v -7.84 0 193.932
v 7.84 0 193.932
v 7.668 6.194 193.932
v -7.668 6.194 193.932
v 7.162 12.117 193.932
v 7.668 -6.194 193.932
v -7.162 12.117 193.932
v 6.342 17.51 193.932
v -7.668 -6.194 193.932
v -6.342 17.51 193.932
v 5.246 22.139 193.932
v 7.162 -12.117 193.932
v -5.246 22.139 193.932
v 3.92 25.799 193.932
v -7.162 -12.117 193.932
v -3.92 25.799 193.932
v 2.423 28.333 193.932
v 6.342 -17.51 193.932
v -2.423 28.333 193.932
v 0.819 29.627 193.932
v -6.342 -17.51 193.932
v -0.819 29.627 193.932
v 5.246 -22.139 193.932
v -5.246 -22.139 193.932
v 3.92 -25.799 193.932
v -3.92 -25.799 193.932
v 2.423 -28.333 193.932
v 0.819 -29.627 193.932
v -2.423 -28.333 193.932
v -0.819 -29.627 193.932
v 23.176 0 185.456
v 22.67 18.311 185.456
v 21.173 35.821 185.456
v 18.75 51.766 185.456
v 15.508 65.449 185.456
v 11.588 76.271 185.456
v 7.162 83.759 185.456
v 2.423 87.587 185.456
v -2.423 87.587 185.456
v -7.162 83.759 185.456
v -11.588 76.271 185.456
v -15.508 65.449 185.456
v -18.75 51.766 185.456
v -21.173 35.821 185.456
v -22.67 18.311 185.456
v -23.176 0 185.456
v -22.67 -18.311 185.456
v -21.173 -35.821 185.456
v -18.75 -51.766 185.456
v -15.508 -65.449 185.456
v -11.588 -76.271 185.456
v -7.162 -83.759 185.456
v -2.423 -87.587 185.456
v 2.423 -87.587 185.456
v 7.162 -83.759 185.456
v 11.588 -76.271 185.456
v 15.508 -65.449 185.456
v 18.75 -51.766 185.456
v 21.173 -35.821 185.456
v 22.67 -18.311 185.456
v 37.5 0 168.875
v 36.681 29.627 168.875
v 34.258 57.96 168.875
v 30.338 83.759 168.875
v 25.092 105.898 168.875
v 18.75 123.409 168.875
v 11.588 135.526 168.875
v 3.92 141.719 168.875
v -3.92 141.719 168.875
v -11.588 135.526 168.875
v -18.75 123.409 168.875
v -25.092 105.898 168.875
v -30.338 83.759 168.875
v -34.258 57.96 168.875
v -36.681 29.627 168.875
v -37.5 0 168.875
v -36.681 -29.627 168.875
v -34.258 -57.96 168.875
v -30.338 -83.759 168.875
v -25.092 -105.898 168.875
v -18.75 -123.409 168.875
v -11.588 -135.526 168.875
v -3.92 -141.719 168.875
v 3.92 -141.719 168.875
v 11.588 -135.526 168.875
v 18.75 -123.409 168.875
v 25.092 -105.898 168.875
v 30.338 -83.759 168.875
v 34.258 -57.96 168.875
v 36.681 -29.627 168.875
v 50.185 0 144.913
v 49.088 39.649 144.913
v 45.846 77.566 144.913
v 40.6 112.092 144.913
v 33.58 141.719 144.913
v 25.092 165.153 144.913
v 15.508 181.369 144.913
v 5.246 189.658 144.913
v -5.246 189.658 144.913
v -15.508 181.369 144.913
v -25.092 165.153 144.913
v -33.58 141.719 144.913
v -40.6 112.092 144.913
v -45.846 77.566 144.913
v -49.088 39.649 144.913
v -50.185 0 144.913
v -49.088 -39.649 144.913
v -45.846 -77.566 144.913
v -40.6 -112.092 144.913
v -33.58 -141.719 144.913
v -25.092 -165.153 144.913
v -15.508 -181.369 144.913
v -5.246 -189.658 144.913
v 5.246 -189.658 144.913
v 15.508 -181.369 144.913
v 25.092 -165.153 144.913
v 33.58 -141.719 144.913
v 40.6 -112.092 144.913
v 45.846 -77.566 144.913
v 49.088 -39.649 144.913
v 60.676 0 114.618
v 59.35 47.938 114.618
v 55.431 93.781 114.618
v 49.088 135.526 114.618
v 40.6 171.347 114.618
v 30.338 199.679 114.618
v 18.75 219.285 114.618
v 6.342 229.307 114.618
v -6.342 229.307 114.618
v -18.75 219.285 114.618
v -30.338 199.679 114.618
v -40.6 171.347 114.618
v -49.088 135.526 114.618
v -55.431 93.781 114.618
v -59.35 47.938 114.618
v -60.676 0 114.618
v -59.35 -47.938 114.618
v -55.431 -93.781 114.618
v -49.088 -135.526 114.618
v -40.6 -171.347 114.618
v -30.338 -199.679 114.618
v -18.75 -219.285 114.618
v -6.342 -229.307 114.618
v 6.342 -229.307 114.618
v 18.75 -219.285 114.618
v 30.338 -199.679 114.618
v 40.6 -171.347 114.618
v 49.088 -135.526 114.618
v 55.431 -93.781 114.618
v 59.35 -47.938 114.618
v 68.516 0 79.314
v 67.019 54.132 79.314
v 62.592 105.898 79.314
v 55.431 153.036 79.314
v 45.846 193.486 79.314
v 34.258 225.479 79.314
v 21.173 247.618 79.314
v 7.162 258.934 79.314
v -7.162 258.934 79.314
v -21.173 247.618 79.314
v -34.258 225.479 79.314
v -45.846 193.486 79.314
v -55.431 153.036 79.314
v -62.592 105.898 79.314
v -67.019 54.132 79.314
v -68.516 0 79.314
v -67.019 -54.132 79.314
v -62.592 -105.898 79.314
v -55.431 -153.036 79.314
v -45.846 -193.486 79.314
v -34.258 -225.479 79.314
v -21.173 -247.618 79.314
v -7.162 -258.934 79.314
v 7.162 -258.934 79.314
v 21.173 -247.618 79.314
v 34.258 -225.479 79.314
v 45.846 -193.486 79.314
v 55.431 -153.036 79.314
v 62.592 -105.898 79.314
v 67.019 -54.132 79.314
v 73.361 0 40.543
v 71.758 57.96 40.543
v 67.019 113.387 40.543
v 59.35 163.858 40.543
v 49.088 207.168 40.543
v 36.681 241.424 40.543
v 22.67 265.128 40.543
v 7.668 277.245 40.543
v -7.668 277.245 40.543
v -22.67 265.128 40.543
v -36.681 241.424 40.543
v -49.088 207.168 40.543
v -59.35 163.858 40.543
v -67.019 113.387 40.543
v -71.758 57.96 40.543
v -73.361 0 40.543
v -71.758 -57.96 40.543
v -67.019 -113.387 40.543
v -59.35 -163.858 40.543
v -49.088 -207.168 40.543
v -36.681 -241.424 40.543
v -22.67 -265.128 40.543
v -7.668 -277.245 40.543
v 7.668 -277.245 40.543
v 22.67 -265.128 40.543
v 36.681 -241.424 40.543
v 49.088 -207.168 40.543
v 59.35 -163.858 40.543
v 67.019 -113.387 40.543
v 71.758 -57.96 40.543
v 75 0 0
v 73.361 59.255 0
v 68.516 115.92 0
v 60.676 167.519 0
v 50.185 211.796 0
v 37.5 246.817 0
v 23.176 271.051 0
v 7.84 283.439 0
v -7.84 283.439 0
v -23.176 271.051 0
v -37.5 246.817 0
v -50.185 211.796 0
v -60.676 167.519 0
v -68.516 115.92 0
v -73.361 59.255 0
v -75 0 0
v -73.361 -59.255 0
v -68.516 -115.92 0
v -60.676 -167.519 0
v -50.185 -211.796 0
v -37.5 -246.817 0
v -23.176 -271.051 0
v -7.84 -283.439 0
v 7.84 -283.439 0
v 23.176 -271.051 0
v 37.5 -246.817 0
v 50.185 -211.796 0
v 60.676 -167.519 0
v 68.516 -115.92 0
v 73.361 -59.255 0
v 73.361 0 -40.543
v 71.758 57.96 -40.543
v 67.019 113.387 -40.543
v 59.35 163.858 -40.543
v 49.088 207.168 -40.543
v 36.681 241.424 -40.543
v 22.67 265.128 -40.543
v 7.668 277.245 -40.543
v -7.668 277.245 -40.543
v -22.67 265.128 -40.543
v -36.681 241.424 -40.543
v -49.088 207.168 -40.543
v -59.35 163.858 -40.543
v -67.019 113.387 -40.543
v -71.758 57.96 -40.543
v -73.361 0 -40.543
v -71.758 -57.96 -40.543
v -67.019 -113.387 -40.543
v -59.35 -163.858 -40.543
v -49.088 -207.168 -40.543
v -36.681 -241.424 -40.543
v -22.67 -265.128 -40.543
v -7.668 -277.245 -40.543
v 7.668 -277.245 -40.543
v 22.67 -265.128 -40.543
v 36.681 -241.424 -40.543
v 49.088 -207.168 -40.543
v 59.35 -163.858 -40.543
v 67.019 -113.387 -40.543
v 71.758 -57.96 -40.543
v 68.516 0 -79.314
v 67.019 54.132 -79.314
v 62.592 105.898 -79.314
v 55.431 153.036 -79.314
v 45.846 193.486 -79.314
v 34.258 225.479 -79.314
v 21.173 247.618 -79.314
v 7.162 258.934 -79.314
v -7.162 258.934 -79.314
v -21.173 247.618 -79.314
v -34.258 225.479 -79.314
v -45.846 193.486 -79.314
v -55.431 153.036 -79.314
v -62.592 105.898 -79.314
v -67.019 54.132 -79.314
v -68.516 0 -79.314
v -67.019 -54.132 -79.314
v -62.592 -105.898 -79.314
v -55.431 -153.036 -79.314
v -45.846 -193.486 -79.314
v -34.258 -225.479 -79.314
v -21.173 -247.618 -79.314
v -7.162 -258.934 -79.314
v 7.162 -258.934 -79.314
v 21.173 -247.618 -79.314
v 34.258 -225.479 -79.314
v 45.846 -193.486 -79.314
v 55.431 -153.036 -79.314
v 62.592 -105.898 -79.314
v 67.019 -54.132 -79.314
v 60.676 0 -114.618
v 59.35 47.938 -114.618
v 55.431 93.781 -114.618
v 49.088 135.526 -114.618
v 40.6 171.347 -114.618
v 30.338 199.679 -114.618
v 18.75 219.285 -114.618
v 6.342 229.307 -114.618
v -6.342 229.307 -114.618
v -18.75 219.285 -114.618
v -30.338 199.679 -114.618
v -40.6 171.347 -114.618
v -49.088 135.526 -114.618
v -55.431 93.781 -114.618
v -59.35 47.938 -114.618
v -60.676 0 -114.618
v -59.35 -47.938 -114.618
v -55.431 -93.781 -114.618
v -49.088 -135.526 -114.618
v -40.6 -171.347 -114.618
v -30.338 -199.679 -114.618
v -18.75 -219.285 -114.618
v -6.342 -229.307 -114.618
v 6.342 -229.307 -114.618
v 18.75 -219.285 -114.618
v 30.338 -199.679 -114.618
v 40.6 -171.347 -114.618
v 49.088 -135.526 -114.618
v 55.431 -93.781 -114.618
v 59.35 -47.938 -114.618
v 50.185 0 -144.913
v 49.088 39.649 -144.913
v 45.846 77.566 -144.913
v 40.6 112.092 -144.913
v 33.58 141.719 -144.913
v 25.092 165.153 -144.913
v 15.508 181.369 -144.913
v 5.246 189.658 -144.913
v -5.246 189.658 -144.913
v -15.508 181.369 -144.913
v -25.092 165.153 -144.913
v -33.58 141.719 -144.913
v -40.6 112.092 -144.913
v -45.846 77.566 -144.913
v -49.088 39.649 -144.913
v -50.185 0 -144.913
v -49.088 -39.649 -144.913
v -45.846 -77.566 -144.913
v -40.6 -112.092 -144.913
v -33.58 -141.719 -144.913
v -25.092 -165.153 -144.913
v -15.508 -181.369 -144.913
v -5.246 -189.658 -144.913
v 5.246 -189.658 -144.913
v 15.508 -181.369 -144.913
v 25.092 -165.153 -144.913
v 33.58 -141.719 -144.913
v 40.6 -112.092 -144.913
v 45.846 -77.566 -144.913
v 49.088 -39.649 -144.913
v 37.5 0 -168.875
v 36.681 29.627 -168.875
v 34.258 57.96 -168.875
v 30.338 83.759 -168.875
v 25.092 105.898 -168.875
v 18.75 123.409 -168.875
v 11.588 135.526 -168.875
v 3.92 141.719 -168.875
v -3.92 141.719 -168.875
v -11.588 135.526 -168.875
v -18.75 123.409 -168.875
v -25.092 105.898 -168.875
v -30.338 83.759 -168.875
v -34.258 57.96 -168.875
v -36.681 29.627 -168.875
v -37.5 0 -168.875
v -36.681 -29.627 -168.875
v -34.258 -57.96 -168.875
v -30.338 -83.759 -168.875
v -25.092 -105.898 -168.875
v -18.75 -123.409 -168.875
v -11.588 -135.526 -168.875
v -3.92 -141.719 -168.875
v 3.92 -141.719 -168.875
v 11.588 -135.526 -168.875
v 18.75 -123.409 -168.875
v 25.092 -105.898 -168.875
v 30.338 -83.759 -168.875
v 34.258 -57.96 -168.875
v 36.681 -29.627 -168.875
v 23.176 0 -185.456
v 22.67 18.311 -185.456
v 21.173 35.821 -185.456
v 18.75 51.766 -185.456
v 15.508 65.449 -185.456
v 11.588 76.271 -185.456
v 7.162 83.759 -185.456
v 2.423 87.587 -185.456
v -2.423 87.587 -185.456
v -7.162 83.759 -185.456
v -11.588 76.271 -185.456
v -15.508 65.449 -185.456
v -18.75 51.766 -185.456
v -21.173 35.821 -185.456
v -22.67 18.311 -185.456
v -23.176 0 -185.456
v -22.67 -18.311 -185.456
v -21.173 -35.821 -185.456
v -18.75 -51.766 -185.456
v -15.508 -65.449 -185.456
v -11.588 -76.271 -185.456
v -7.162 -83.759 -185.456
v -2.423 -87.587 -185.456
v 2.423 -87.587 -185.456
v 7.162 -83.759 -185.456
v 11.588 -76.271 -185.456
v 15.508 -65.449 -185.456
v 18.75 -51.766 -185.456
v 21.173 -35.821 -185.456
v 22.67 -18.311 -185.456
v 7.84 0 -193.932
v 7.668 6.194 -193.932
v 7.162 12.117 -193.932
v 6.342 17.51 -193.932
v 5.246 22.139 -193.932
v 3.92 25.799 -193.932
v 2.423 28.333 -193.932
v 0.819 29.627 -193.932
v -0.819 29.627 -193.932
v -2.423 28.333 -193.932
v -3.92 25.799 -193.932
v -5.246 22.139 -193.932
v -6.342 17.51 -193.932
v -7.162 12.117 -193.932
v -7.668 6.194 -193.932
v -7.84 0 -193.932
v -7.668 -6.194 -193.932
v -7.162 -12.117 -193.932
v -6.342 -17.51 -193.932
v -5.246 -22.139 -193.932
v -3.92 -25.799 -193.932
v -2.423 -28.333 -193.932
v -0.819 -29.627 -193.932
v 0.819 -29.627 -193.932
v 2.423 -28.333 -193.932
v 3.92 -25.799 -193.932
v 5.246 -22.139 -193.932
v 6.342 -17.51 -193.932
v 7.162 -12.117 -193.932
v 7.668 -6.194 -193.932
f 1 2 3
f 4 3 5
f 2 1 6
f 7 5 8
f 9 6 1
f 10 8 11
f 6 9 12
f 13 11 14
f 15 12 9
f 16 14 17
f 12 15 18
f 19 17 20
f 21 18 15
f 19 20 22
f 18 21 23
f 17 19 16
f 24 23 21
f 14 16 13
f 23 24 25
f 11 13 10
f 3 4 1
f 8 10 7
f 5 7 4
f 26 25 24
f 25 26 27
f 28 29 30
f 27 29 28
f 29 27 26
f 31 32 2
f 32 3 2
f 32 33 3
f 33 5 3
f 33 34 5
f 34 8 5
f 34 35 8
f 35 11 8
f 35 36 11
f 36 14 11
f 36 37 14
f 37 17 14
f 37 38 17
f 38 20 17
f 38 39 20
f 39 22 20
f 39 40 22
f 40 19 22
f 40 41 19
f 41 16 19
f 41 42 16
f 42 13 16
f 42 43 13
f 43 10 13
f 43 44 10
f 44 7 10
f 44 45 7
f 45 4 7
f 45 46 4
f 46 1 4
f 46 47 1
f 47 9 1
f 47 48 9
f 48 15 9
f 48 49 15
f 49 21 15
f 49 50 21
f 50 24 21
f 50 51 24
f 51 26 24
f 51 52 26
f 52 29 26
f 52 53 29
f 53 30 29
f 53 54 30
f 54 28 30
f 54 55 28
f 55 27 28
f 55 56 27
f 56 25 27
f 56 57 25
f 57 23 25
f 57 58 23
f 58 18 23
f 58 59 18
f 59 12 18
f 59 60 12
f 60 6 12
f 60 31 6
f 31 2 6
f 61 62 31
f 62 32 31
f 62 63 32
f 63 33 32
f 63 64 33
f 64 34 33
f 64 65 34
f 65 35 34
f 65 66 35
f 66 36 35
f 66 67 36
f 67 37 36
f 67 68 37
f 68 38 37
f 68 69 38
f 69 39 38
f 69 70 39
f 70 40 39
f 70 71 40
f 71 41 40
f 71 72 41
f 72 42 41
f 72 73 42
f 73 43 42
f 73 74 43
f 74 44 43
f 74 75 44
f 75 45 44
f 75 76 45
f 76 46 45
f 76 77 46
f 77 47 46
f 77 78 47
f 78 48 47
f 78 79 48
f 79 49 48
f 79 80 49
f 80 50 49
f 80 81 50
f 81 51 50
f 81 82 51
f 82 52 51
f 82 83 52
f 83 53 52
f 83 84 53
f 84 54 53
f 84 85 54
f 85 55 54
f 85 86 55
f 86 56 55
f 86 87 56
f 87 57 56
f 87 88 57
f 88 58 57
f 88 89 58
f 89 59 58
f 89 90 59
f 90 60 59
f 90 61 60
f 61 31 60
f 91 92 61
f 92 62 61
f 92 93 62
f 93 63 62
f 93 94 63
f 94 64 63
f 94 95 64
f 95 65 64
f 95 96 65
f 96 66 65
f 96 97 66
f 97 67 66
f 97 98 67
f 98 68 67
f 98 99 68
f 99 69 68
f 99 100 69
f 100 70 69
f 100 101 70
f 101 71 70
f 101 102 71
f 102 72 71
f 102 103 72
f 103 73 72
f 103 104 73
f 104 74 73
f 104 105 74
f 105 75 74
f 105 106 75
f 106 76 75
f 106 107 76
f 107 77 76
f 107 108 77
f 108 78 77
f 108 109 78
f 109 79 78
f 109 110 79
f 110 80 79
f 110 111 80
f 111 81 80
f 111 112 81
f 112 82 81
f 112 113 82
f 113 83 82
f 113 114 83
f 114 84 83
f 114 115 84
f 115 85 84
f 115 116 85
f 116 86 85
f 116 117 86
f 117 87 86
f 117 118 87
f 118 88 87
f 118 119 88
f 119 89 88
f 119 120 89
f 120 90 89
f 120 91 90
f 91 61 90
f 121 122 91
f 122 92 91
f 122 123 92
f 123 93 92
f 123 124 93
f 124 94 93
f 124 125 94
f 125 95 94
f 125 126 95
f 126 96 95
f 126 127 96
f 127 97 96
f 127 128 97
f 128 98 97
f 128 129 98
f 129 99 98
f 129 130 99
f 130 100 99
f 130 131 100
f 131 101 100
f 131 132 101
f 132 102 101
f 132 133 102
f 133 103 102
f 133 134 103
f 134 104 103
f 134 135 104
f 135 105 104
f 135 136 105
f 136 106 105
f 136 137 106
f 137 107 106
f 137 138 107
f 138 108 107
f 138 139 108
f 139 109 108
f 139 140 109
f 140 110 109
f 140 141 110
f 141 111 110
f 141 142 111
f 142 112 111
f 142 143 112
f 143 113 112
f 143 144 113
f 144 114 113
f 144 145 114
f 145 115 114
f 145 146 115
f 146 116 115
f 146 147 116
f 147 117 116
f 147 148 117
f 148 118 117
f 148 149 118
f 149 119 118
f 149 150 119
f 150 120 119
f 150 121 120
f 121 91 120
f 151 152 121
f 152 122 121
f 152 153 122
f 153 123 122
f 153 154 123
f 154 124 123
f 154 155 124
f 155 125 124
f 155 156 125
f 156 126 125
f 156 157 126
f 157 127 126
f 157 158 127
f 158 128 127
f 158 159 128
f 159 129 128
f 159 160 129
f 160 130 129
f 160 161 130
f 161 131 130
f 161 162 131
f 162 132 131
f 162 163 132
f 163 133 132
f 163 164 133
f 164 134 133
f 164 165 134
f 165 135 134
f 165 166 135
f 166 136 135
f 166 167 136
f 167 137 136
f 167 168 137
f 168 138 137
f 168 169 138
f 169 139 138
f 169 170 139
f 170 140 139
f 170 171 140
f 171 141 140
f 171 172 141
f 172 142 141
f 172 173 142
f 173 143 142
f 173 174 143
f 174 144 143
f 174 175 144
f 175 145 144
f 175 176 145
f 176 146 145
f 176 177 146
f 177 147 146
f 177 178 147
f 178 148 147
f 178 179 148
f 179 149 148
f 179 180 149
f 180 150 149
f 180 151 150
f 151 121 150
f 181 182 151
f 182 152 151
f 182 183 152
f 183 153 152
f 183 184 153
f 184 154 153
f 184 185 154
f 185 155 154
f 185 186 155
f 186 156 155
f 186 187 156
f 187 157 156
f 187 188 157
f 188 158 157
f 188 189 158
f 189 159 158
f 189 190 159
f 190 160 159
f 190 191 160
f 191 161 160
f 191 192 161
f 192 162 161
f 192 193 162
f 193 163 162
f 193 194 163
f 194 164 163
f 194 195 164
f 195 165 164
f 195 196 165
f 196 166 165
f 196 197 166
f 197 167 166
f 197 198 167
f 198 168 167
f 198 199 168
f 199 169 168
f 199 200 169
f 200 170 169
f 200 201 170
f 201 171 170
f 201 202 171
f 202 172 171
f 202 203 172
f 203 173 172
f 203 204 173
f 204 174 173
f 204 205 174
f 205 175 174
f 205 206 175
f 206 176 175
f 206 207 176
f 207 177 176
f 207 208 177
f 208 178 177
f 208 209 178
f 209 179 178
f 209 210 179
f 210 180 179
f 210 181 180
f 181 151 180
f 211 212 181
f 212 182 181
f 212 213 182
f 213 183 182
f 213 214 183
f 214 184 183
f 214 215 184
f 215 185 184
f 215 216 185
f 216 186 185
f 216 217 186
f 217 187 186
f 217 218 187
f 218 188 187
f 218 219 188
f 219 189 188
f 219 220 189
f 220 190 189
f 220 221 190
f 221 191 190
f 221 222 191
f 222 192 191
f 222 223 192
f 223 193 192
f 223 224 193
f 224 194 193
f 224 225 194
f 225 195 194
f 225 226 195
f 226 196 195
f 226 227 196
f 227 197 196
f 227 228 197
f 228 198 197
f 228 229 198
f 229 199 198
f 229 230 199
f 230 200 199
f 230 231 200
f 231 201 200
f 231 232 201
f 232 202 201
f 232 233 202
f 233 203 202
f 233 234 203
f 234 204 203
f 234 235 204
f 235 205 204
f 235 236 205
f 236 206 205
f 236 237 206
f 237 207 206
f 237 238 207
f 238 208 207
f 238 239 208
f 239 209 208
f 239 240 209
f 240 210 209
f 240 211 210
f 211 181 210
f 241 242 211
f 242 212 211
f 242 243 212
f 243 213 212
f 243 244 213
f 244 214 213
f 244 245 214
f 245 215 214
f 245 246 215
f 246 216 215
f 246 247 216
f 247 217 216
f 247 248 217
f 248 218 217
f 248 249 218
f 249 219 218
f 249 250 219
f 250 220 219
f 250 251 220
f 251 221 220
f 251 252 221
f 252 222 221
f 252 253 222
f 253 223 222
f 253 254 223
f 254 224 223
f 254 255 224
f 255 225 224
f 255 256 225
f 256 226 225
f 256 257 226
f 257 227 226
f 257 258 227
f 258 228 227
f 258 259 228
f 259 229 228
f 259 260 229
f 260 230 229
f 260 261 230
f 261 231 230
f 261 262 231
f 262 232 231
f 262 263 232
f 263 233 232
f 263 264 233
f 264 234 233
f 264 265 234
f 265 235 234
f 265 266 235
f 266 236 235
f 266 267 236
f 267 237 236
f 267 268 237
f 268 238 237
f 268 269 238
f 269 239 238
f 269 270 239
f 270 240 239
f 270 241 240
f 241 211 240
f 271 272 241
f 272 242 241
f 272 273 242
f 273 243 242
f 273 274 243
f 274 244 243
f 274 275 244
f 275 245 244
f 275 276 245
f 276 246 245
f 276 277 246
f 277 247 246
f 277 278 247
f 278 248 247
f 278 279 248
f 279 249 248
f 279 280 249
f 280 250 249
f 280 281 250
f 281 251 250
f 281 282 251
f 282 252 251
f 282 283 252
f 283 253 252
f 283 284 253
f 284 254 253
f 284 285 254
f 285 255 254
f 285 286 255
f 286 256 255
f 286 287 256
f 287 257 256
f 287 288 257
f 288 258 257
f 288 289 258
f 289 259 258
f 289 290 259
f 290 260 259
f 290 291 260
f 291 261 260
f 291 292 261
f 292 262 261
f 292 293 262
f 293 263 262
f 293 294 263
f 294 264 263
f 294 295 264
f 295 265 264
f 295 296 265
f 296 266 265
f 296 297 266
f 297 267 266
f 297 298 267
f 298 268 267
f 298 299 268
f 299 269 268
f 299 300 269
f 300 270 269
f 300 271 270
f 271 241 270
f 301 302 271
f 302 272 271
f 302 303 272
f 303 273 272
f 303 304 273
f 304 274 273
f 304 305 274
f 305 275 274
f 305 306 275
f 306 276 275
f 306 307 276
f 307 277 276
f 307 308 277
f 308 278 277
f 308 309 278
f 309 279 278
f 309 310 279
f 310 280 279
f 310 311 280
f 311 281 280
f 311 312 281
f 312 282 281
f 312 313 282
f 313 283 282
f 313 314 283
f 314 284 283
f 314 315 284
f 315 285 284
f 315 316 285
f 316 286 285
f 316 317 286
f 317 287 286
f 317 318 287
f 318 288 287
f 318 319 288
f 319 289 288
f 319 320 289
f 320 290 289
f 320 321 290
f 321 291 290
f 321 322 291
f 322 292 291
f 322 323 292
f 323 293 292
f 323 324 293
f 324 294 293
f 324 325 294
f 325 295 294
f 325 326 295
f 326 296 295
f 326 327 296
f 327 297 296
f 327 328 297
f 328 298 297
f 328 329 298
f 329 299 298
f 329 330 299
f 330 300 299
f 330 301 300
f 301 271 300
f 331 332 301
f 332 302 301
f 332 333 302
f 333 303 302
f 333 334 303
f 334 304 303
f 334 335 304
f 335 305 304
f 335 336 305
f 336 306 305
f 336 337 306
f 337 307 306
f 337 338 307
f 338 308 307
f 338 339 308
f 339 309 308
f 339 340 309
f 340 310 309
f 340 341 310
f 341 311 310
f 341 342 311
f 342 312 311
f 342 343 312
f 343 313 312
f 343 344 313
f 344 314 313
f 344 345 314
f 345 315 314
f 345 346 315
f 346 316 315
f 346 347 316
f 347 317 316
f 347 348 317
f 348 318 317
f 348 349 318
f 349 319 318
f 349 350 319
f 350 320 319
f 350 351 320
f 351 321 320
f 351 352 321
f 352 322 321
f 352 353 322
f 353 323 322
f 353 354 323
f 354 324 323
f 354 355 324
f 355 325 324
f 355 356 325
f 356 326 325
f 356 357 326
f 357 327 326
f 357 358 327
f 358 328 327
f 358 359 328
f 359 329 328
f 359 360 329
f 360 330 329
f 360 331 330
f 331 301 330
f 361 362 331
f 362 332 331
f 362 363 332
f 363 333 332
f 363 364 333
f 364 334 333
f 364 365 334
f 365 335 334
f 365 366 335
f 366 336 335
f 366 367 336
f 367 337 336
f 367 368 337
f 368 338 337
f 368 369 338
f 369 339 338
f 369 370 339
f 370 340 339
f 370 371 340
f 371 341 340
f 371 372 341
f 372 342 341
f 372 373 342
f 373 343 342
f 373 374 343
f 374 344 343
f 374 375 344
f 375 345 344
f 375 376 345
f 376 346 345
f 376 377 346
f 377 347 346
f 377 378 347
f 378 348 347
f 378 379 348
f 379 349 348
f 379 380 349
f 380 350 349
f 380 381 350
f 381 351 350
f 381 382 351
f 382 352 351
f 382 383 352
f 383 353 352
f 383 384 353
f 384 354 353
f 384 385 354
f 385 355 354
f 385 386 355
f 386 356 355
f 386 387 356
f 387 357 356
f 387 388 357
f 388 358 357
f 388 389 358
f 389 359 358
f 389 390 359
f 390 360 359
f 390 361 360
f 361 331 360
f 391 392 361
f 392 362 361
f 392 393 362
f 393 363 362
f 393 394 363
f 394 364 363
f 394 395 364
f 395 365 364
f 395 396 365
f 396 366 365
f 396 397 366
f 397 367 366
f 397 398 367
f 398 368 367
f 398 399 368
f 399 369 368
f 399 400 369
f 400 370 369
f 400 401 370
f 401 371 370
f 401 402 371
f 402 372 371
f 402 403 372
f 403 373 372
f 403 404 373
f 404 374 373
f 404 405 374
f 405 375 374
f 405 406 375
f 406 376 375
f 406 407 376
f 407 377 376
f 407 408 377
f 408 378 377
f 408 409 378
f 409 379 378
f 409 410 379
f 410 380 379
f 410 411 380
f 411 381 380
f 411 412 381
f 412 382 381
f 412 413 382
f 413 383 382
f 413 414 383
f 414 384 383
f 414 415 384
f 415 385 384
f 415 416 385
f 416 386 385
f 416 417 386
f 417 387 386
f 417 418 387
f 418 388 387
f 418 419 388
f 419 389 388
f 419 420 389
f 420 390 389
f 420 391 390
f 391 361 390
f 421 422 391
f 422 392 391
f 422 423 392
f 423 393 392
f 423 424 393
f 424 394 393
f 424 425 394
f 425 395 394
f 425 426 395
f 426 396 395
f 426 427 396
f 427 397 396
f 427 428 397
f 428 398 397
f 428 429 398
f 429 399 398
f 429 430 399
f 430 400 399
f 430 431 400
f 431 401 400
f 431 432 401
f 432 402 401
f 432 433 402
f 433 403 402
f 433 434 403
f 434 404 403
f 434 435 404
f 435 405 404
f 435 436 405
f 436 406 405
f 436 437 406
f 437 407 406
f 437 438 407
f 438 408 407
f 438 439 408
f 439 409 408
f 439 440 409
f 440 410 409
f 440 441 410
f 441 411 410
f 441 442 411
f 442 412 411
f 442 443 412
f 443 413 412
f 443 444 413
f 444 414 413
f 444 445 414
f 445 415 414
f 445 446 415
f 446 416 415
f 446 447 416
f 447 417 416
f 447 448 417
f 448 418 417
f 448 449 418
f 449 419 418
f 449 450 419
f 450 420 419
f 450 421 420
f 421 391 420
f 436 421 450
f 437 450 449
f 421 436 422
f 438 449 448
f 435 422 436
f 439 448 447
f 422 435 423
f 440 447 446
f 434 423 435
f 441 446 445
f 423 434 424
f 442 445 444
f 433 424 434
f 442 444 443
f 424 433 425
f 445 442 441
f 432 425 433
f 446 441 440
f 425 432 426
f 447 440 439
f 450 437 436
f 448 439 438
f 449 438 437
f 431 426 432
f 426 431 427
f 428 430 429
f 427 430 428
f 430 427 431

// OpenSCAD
// Generated by SolidPython 1.0.1 on 2020-07-29 00:46:47


scale(v = [5, 19, 13]) {
	sphere(r = 15);
}
/***********************************************
*********      SolidPython code:      **********
************************************************
 
# import packages: SolidPython
from solid import *
from solid.utils import *
from itertools import chain, combinations, permutations


class Resize:

    def __init__(self, scad_file):
        self.scad_file = scad_file
        #self.scad_file = import_scad(scad_file)
        # cone/cylinder param:
        self.r1 = 0
        self.r2 = 0
        self.h = 0
        # rectangular prism param:
        self.w = 0
        self.l = 0
        # ellipse param:
        self.r = 0

    # import OpenScad code (file name corresponds to shape)


    # classify shape + parameters
    def assign(self, param1, param2, param3):
        if self.scad_file == 'cone.scad':
            self.r1 = param1
            self.r2 = param2
            self.h = param3
        elif self.scad_file == 'cylinder.scad':
            self.r1 = param1
            self.r2 = param2
            self.h = param3
        elif self.scad_file == 'rectangularPrism.scad':
            self.h = param1
            self.l = param2
            self.w = param3
        else:
            self.r = param1
            self.h = param2

    # resize parameters
    def iterate(self):
        x = range(3, 20, 2)
        i = 1
        if self.scad_file == 'cone.scad':
            tempList = list(permutations(x, 2))
            for temp in tempList:
                param1 = temp[0]
                param2 = temp[1]
                filepath = 'produced_scad_files/' + 'cone' + str(param1) + '_' + str(param2) + '_' + '.scad'
                scad_render_to_file(cylinder(h=param1, r1=param2, r2=0), filepath)

        elif self.scad_file == 'cylinder.scad':
            tempList = list(permutations(x, 3))
            for temp in tempList:
                param1 = temp[0]
                param2 = temp[1]
                filepath = 'produced_scad_files/' + 'cylinder' + str(param1) + '_' + str(param2) + '_' + '.scad'
                scad_render_to_file(cylinder(h=param1, r1=param2, r2=param2), filepath)

        elif self.scad_file == 'rectangularPrism.scad':
            tempList = list(permutations(x, 3))
            for temp in tempList:
                param1 = temp[0]
                param2 = temp[1]
                param3 = temp[2]
                filepath = 'produced_scad_files/' + 'rectangularPrism' + str(param1) + '_' + str(param2) + '_' + str(
                    param3) + '.scad'
                scad_render_to_file(cube(size=(param1, param2, param3)), filepath)

        elif self.scad_file == 'ellipse.scad':
            tempList = list(permutations(x, 4))
            for temp in tempList:
                param1 = temp[0]
                param2 = temp[1]
                param3 = temp[2]
                param4 = temp[3]
                filepath = 'produced_scad_files/' + 'ellipse' + str(param1) + '_' + str(param2) + '_' + str(param3) + '_' + str(param4) + '.scad'
                scad_render_to_file(scale([param1, param2, param3])(sphere(r=param4)), filepath)

    def render_to_scadfile(self):
        scad_render_to_file(scad, 'example.scad') 
 
************************************************/
